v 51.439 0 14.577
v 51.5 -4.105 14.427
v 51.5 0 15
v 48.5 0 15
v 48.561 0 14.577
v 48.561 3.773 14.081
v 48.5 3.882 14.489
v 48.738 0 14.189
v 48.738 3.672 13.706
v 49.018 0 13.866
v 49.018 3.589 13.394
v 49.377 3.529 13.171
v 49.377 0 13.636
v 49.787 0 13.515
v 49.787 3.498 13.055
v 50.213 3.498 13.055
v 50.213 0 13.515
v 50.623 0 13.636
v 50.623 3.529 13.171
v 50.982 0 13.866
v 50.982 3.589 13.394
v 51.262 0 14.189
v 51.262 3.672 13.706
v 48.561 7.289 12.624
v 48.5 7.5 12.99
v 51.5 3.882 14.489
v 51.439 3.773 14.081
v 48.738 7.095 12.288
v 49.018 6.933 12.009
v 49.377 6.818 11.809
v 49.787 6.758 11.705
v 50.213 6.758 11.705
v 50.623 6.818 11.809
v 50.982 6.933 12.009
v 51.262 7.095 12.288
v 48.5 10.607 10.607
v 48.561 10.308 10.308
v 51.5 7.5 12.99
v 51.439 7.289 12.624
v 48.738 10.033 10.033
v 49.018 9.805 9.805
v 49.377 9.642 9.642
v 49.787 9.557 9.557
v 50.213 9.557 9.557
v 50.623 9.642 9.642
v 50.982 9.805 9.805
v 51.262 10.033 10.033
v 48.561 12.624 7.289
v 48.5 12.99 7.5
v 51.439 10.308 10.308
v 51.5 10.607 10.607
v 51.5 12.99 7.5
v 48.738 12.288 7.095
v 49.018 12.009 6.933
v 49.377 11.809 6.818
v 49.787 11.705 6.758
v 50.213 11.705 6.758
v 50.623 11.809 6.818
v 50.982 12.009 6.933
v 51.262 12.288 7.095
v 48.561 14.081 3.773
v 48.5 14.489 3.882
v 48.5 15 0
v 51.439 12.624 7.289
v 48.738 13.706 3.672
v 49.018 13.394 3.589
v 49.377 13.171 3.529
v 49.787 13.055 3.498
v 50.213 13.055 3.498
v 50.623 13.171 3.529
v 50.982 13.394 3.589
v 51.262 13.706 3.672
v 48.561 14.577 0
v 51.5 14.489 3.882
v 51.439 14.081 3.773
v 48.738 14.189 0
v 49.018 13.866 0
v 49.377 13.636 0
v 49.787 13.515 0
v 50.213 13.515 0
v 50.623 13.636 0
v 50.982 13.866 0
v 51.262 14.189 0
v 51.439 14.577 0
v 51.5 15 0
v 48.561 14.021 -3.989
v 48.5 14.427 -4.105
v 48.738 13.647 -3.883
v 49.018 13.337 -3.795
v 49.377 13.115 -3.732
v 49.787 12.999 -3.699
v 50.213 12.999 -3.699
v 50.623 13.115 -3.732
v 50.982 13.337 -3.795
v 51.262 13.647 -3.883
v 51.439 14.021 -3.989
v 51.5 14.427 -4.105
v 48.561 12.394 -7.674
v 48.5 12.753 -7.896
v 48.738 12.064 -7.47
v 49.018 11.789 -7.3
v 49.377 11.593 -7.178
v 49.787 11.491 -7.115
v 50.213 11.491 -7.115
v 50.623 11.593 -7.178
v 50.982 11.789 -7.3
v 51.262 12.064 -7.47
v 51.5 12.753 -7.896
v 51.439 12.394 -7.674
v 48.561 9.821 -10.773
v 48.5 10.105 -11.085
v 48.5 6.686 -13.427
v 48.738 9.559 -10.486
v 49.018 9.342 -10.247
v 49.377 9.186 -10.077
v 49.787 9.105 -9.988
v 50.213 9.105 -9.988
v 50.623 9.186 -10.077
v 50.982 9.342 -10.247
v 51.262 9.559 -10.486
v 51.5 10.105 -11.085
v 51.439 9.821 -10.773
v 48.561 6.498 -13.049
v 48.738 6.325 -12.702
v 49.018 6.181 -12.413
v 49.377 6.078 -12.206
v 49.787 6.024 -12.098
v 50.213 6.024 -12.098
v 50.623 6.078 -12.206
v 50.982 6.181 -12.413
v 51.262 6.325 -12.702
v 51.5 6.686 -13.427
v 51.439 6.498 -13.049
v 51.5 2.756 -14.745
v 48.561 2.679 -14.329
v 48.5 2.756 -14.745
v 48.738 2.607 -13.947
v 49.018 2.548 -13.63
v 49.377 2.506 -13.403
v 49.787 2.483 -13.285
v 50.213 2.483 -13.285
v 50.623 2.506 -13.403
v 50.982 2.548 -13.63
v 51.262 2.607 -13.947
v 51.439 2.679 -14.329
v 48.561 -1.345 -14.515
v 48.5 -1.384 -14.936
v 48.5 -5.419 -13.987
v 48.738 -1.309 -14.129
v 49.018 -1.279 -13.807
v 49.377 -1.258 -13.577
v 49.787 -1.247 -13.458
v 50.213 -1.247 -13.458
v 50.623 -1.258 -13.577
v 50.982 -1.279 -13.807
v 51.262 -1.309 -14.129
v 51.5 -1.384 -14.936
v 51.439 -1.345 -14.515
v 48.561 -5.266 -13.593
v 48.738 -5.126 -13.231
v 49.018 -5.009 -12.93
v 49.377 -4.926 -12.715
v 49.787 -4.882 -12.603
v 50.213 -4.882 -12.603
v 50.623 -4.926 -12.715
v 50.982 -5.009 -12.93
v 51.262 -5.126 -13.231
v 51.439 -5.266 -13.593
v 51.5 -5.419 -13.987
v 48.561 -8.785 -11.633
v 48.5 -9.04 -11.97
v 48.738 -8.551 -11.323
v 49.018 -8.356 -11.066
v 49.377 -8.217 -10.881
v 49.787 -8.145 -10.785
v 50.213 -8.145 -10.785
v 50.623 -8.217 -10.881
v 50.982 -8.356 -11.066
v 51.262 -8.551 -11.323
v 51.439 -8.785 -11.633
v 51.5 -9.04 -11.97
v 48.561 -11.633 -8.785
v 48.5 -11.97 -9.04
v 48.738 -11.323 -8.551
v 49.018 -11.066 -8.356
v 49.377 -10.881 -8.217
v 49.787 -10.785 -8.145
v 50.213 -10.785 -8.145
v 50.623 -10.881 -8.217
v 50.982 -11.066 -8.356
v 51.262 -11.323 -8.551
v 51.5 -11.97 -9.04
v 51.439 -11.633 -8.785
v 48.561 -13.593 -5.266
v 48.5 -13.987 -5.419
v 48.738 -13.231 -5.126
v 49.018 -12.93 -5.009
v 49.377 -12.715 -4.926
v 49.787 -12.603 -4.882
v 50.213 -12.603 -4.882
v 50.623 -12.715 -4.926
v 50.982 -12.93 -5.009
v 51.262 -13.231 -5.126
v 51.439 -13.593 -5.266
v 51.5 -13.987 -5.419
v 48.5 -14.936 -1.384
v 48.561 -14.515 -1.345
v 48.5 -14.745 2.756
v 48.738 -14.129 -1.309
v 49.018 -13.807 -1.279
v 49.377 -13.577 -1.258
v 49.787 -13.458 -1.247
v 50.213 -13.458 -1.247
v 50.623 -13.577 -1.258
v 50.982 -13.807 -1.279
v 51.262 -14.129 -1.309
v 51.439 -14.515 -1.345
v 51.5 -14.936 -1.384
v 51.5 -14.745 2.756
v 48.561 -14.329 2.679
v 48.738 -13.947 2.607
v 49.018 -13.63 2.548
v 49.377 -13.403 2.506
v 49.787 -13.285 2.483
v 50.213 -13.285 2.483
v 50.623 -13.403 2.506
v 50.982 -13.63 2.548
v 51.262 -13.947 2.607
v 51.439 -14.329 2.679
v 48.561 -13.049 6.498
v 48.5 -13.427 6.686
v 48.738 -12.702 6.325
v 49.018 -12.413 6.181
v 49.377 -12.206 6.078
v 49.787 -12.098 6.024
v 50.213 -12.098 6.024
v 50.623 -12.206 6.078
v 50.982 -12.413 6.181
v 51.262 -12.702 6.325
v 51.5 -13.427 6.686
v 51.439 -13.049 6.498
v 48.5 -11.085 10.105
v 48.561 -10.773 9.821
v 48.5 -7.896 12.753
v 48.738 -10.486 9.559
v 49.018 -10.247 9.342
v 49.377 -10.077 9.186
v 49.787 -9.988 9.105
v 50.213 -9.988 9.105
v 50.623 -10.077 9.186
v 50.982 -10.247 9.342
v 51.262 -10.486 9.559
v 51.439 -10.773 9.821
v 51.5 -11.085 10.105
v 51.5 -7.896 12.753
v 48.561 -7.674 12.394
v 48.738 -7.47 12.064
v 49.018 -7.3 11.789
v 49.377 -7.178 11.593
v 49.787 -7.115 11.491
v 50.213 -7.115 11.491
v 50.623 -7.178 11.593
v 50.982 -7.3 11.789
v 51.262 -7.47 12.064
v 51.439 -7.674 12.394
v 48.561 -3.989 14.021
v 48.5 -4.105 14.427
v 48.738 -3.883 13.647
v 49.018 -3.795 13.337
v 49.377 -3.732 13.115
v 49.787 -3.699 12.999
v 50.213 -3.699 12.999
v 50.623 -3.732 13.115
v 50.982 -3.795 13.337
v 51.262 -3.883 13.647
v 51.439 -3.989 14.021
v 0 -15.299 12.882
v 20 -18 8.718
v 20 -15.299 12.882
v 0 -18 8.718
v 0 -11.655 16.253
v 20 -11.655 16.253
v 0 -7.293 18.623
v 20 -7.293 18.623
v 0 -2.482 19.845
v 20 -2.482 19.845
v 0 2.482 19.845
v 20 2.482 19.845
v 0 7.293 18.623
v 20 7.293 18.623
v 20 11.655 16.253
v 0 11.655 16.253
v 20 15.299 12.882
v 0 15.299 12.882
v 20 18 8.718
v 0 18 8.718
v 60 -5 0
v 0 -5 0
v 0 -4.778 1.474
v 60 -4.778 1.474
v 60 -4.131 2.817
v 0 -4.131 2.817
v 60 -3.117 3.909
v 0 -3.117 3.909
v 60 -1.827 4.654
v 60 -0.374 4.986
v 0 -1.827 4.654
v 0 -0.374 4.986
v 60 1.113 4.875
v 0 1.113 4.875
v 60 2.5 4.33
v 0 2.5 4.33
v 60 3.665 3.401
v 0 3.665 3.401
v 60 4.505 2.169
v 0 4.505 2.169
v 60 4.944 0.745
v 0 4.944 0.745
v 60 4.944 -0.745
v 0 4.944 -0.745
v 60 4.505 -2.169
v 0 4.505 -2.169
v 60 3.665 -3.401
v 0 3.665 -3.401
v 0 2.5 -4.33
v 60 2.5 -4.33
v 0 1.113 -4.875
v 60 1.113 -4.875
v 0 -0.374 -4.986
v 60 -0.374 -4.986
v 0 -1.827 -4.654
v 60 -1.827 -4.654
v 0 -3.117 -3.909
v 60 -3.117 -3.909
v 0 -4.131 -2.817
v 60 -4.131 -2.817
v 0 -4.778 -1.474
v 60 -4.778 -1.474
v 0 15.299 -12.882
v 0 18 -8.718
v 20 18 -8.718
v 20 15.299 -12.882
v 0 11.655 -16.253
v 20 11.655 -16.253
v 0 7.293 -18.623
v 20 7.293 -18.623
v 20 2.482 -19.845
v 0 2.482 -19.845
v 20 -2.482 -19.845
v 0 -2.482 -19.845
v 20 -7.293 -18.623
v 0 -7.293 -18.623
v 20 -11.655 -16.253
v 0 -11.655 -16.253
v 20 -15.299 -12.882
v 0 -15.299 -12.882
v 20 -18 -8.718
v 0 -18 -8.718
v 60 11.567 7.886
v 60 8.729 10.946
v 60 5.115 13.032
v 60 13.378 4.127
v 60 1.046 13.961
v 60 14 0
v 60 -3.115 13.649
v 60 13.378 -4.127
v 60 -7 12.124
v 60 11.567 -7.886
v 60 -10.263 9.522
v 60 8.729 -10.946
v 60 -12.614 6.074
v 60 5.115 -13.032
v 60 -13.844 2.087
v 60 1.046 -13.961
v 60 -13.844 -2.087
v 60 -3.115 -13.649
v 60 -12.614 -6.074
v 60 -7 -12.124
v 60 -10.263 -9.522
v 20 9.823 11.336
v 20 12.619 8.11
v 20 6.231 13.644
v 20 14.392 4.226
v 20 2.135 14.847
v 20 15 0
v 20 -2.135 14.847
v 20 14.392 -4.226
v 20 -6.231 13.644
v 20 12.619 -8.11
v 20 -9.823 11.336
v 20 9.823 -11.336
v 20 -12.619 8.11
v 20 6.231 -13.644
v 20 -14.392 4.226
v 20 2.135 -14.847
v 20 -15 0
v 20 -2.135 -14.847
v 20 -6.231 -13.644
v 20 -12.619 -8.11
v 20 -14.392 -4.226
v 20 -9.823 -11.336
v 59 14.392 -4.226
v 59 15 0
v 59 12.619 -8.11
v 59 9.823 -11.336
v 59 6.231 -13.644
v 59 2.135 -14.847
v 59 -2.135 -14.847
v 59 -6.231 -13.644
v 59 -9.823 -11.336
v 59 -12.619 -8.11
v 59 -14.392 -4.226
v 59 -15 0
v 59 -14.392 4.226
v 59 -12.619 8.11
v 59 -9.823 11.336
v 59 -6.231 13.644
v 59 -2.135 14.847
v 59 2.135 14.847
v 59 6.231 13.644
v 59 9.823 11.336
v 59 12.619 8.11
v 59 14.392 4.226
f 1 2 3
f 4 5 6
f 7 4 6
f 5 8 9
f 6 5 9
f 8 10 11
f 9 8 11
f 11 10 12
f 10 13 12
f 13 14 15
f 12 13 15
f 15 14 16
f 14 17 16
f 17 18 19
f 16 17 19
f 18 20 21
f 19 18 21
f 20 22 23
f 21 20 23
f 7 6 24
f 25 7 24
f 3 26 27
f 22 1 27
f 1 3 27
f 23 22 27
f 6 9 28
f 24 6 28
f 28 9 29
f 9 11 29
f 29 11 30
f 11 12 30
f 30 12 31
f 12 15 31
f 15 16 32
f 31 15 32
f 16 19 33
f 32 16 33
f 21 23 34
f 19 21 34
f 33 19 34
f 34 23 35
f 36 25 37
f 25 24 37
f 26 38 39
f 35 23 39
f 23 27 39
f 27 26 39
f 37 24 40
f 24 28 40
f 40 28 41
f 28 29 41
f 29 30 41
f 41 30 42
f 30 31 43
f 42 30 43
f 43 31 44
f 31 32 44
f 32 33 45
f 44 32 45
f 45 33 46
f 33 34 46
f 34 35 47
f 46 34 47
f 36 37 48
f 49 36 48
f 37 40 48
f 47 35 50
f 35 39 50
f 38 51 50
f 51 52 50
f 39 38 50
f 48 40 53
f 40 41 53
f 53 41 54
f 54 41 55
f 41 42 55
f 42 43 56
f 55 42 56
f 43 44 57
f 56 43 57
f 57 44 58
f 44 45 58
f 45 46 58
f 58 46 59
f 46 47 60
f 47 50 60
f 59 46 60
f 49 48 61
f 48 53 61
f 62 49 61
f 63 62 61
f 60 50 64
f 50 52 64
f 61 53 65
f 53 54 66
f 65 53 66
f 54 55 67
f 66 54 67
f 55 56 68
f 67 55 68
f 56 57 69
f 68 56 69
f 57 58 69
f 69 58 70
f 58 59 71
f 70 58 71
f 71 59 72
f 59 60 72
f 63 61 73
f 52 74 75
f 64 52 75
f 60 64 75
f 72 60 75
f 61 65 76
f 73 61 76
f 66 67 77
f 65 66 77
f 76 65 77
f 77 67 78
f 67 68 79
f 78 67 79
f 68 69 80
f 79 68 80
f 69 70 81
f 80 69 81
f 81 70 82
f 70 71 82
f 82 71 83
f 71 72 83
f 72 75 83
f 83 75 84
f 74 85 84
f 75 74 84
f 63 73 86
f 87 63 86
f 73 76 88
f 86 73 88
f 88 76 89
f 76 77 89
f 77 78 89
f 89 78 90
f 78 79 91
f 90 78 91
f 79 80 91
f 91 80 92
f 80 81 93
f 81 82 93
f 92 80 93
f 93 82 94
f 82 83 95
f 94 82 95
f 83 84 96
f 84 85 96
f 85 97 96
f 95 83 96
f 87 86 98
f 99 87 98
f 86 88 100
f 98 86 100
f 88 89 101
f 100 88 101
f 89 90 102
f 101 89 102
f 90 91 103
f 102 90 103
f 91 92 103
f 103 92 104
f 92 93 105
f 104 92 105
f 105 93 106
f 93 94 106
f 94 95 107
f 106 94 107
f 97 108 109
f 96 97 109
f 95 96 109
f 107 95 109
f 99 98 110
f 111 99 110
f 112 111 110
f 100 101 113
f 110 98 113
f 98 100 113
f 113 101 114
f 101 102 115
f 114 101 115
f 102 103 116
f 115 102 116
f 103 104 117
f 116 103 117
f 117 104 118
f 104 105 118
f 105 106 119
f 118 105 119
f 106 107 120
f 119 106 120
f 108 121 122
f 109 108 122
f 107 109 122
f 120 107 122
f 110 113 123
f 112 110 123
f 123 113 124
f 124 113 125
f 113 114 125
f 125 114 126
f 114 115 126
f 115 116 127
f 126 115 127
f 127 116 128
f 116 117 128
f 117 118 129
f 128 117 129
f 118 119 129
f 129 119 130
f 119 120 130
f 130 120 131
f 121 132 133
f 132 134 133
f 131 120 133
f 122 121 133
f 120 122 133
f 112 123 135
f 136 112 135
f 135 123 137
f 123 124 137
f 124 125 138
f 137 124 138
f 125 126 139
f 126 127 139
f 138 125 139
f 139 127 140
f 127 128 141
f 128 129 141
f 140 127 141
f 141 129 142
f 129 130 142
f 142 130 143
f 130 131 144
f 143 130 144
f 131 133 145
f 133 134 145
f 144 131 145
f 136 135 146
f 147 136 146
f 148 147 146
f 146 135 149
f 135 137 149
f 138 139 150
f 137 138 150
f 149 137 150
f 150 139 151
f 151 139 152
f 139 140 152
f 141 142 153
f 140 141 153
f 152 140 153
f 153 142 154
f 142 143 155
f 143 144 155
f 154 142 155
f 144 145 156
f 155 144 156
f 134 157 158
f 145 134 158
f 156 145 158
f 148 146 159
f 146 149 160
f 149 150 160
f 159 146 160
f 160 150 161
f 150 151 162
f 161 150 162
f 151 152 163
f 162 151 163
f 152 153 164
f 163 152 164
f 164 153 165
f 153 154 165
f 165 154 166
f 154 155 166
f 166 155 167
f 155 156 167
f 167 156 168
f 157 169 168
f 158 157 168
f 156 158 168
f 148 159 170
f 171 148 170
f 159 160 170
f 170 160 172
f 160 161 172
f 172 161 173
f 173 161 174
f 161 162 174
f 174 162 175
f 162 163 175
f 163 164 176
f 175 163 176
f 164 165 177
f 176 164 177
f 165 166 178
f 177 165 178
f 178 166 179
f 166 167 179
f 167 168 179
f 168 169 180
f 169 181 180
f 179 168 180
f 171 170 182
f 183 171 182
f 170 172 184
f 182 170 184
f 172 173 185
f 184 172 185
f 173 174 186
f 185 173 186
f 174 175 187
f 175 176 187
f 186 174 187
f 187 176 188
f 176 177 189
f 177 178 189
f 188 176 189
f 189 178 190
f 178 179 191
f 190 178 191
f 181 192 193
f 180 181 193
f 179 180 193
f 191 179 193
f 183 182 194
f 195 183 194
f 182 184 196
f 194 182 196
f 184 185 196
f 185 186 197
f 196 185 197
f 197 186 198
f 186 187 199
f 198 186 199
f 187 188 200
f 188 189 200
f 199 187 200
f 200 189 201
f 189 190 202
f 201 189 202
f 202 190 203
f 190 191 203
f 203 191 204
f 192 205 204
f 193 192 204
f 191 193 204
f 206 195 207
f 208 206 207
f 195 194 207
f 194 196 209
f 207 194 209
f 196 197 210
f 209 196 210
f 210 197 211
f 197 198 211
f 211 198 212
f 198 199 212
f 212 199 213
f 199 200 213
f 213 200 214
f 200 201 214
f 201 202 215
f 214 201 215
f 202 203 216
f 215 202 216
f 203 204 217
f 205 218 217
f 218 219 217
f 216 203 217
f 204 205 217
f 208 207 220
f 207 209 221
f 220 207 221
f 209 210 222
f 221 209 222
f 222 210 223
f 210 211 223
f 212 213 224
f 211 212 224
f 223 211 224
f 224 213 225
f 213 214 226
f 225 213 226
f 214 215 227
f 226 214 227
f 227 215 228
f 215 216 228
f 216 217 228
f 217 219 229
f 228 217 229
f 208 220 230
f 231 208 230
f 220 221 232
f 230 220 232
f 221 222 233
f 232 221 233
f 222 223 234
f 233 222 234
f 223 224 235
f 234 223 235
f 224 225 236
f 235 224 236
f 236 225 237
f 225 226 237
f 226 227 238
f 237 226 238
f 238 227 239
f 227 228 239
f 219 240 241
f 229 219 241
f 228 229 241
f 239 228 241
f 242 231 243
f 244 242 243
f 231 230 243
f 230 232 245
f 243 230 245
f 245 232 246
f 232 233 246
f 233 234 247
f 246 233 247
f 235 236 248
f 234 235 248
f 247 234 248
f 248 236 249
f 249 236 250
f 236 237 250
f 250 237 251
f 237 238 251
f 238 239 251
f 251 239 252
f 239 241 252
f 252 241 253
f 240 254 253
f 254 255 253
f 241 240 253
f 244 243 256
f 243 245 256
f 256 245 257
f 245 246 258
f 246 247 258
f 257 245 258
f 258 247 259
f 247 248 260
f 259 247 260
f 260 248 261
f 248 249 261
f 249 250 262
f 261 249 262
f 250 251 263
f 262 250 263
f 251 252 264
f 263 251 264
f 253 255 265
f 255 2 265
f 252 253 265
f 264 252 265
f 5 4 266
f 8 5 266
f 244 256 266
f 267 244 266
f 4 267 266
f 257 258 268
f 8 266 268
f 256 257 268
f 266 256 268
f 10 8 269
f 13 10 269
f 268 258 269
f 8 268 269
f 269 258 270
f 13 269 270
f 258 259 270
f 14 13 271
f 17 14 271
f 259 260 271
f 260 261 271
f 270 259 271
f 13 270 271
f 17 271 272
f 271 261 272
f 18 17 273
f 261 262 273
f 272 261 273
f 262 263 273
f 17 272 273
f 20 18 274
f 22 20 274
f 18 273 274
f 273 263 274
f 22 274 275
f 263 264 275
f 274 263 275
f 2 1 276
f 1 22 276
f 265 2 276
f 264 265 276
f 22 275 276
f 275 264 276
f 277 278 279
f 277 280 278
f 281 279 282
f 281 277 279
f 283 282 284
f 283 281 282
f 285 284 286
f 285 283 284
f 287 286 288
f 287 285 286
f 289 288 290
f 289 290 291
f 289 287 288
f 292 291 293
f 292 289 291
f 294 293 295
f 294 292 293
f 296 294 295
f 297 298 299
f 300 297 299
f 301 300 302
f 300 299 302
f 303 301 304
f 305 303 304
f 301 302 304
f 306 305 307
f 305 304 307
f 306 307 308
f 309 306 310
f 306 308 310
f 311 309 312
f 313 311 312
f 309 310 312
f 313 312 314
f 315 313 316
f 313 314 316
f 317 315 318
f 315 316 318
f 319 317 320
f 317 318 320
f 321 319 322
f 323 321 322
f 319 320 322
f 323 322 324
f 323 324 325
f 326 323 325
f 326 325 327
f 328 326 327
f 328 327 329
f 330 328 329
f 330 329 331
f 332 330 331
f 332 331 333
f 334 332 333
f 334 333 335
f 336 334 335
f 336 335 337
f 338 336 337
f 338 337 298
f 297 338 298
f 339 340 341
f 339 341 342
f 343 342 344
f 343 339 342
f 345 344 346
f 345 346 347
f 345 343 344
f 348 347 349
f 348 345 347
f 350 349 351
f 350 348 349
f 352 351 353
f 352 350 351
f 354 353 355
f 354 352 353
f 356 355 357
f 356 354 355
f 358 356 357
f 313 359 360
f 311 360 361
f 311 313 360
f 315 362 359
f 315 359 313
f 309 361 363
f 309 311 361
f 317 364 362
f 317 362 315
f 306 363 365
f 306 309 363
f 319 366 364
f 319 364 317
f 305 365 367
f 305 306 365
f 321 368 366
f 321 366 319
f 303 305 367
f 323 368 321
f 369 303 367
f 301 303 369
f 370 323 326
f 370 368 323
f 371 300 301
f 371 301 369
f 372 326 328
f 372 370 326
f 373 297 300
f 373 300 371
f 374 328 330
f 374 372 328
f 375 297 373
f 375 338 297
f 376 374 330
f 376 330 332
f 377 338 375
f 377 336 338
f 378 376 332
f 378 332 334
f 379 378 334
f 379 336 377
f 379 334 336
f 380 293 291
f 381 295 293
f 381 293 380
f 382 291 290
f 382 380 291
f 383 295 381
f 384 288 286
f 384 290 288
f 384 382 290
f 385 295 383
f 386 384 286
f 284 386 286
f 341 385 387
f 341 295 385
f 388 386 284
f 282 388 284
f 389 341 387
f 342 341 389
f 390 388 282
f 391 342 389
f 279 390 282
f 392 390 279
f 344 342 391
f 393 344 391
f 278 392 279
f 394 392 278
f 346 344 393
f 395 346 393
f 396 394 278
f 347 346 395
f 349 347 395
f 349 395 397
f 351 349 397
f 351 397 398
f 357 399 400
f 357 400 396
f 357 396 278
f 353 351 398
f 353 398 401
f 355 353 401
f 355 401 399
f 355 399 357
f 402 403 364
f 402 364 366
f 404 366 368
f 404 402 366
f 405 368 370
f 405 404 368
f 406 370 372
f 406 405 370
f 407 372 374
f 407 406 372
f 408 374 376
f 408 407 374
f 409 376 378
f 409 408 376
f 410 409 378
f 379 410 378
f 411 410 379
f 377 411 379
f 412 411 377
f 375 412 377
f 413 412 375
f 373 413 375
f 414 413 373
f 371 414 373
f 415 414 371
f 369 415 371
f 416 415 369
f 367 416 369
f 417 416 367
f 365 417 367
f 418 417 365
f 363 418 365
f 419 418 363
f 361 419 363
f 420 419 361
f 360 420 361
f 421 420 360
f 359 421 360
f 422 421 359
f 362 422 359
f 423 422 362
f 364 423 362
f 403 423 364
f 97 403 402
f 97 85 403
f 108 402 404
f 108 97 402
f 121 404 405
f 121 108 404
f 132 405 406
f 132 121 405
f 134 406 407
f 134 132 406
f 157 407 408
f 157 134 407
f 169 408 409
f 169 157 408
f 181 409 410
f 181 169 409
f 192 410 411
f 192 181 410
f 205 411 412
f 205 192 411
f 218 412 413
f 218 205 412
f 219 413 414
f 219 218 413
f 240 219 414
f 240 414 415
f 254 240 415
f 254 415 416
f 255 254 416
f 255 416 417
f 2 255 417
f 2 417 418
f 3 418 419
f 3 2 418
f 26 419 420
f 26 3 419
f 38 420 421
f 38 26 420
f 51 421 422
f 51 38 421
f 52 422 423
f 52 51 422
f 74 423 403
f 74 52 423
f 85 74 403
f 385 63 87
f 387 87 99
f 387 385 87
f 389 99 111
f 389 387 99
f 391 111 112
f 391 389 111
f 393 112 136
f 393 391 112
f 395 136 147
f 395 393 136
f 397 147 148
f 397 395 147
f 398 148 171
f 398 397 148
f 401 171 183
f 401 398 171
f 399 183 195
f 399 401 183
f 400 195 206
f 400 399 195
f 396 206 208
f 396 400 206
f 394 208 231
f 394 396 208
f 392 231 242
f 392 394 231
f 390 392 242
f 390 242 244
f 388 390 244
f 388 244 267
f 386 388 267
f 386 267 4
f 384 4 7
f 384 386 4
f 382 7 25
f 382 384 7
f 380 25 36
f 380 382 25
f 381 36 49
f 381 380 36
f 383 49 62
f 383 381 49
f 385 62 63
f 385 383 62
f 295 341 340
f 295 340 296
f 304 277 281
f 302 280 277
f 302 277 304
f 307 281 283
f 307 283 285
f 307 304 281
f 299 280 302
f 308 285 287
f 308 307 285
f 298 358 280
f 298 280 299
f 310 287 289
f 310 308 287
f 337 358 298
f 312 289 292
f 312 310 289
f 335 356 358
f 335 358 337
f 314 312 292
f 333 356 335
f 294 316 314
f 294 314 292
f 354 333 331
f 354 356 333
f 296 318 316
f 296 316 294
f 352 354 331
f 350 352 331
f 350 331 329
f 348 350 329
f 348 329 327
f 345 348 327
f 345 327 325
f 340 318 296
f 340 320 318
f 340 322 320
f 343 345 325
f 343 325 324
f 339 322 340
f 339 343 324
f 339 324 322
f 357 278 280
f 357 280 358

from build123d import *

# Parameters (mm, degrees)
F2_SIZE  = 1
F4_DEPTH = 60.001
F5_R     = 5
F6_DEPTH = 60.001
F7_R     = 1.5


with BuildPart() as f1:
    # F0 (on Top) → F1 (revolve)
    with BuildSketch(Plane.XY):
        Polygon((0, 20), (0, 0), (60, 0), (60, 15), (20, 15), (20, 20), align=None)
    revolve(axis=Axis((30, 0, 0), (-1, 0, 0)))

    # F2
    f2_edges = [f1.edges().sort_by_distance(p)[0] for p in [
        (60, -15, 0),
    ]]
    chamfer(f2_edges, length=F2_SIZE)

    # F3 (on face) → F4 (cut, through all)
    with BuildSketch(Plane(origin=(0, 0, 0), x_dir=(0, -1, 0), z_dir=(-1, 0, 0))):
        with BuildLine():
            Line((-18, -8.7177978871), (-18, 8.7177978871))
            ThreePointArc((-18, 8.7177978871), (-20, 0), (-18, -8.7177978871))
        make_face()
        with BuildLine():
            ThreePointArc((20, 0), (19.4935886896, 4.472135955), (18, 8.7177978871))
            Line((18, 8.7177978871), (18, -8.7177978871))
            ThreePointArc((18, -8.7177978871), (19.4935886896, -4.472135955), (20, 0))
        make_face()
    extrude(amount=-F4_DEPTH, mode=Mode.SUBTRACT)

    # F5 (on face) → F6 (cut, through all)
    with BuildSketch(Plane(origin=(0, 0, 0), x_dir=(0, -1, 0), z_dir=(-1, 0, 0))):
        Circle(F5_R)
    extrude(amount=-F6_DEPTH, mode=Mode.SUBTRACT)

    # F7 (on Front) → F8 (revolve, cut)
    with BuildSketch(Plane.XZ):
        with Locations((50, 15)):
            Circle(F7_R)
    revolve(axis=Axis((60, 0, 0), (-1, 0, 0)), mode=Mode.SUBTRACT)


solid = f1.part
